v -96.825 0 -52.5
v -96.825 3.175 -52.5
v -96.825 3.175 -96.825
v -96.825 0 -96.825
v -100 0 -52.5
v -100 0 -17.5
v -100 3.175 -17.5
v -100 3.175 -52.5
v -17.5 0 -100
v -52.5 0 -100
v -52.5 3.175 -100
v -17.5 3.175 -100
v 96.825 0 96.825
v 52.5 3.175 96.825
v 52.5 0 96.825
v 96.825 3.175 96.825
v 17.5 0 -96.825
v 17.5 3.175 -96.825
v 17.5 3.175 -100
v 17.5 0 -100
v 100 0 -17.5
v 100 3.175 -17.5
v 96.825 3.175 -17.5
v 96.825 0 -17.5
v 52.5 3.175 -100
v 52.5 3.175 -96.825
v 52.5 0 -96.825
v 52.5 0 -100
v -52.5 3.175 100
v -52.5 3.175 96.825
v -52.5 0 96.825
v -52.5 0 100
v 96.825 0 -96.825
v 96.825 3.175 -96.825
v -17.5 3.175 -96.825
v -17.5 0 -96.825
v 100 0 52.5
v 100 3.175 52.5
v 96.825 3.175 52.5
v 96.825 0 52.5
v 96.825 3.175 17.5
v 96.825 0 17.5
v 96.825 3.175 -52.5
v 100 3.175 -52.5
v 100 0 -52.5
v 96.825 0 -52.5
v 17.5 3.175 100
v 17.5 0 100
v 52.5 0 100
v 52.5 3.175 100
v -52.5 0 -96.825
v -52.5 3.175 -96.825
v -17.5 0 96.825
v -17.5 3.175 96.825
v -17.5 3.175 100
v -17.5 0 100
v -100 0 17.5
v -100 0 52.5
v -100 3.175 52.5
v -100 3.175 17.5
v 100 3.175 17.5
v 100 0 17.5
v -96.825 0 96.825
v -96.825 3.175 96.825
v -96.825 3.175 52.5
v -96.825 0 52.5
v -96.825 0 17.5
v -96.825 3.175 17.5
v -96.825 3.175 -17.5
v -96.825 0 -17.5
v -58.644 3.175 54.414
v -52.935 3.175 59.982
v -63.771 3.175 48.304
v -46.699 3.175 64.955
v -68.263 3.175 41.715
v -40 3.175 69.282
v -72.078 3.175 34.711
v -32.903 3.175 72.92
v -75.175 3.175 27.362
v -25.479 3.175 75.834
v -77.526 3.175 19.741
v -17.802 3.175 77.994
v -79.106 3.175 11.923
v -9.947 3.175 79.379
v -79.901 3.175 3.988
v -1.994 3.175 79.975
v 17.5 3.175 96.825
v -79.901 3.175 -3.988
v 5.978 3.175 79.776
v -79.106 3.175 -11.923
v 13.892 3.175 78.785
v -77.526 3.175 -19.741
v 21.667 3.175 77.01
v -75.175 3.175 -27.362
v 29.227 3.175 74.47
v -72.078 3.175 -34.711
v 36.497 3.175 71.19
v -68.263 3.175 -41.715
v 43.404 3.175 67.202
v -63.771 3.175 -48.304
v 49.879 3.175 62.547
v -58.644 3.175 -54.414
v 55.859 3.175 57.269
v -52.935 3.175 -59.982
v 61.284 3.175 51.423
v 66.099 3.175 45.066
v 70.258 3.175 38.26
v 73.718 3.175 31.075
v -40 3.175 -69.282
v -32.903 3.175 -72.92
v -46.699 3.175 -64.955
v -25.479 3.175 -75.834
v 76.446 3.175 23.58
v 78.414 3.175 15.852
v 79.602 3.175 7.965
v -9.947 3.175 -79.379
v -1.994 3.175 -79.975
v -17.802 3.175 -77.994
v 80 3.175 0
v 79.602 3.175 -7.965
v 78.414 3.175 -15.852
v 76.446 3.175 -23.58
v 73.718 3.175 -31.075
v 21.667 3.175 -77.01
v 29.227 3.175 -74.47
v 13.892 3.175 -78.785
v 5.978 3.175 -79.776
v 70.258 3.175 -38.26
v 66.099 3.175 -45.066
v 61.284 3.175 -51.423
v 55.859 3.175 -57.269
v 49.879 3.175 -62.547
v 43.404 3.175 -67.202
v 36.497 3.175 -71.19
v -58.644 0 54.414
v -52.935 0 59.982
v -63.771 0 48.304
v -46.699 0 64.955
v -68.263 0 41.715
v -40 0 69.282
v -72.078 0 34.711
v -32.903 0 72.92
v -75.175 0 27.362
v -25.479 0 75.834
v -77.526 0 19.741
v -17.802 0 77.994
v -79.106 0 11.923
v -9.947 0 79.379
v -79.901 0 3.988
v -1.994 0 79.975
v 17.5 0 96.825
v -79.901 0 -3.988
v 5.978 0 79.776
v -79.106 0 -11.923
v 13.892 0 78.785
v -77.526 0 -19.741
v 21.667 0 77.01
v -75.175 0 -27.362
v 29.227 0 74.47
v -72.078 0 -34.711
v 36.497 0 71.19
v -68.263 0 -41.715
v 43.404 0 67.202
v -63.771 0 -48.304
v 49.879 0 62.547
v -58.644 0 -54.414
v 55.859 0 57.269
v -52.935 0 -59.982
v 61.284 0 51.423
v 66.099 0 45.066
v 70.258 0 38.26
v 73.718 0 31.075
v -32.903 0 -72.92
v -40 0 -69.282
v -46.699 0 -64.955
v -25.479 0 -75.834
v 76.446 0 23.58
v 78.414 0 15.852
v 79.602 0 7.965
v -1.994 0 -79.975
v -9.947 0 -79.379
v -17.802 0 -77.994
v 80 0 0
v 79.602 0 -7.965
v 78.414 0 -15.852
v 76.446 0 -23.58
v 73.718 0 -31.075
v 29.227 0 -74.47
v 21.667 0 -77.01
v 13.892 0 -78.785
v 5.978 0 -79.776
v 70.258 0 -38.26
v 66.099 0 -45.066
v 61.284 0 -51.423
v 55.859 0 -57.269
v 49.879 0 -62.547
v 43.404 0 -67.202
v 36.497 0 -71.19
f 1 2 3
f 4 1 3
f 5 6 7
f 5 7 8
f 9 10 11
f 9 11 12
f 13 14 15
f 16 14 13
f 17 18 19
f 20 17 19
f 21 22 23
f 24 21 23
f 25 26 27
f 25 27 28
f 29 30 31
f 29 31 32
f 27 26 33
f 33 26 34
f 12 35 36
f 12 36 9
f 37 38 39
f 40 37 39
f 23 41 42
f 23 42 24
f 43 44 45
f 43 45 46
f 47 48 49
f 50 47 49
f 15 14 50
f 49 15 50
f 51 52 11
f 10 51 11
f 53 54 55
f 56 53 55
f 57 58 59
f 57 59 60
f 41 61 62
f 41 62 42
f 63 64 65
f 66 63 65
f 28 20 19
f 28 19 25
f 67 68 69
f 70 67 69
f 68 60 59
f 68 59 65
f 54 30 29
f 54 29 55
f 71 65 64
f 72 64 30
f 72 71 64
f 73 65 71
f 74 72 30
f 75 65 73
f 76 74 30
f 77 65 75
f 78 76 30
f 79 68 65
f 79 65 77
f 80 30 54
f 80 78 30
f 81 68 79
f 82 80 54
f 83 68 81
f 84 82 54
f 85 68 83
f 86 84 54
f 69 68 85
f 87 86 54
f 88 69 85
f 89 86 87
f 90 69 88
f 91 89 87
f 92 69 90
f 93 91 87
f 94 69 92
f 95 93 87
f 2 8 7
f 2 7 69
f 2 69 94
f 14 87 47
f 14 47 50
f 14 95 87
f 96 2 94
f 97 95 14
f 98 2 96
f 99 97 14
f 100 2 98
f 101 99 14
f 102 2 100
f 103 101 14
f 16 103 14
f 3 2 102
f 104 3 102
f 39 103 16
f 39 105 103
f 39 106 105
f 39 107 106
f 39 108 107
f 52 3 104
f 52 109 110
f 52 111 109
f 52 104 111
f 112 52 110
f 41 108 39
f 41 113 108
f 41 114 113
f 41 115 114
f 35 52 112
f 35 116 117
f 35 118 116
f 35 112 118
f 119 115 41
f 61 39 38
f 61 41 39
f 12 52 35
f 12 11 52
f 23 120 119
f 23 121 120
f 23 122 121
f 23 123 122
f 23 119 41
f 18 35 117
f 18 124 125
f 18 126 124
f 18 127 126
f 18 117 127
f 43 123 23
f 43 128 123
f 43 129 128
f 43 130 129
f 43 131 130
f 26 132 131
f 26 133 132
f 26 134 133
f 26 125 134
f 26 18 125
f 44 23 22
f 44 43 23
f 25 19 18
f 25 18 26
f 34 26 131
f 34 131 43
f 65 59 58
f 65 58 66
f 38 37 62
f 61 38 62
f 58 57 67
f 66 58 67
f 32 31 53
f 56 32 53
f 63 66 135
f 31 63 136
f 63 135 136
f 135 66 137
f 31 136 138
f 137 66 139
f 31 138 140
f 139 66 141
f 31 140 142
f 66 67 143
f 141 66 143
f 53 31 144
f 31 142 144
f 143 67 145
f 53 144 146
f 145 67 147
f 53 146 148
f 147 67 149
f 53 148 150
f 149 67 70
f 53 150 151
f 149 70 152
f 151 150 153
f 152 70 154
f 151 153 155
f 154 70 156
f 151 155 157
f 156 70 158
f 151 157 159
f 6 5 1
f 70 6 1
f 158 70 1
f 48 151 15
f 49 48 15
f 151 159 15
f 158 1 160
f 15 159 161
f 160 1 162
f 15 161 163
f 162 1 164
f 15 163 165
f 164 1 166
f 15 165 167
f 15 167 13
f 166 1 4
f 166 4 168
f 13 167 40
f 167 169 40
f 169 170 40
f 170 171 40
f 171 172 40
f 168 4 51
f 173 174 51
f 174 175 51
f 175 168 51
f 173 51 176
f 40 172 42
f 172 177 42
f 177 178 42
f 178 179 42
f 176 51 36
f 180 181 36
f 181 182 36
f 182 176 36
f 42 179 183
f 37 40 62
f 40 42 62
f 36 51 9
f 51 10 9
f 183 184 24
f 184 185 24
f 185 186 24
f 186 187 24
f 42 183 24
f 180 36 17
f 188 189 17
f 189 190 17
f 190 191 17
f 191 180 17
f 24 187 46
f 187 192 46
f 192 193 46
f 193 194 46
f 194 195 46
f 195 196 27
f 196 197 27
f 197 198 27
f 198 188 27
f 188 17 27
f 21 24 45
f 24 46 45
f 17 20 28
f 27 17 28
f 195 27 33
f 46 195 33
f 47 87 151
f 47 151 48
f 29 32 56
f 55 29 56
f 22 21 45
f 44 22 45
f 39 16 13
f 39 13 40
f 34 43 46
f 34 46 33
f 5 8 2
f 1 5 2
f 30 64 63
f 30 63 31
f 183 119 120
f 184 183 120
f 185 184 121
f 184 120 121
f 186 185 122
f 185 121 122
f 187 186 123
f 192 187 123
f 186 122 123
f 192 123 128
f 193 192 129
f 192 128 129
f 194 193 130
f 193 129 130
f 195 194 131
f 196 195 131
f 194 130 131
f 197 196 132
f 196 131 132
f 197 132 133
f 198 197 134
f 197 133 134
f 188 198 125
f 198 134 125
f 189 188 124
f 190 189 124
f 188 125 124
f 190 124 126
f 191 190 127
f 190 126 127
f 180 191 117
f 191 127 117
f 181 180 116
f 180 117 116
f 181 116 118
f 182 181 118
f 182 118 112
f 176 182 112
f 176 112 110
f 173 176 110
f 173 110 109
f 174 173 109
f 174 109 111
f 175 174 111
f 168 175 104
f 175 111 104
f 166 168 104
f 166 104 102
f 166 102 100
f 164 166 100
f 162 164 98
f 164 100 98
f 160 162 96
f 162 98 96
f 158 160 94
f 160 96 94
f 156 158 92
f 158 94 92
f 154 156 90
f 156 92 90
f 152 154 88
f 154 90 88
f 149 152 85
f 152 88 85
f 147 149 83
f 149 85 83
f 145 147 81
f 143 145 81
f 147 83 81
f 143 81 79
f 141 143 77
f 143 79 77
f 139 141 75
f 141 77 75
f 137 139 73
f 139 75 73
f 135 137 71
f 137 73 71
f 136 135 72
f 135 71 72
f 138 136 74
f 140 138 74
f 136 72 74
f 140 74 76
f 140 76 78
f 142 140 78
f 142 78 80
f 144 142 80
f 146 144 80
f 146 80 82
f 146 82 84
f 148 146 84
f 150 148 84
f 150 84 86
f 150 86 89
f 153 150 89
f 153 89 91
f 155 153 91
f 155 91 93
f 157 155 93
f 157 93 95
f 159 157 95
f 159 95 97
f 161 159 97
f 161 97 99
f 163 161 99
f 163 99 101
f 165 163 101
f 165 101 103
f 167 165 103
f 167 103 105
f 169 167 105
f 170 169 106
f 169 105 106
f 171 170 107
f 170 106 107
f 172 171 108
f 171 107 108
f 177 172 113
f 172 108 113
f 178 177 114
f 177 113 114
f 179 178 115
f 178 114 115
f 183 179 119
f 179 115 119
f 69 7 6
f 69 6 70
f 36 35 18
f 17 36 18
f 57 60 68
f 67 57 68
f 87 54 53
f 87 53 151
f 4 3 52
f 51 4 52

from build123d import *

# Parameters (mm, degrees)
ESQUISSE1_W             = 200
ESQUISSE1_H             = 200
BOSS_EXTRU_1_DEPTH      = 3.175
ESQUISSE2_W             = 3.175
ESQUISSE2_H             = 35
ESQUISSE2_H_2           = 47.5
ENL_V_MAT_EXTRU_1_DEPTH = 3.175
ESQUISSE4_W             = 44.325
ESQUISSE4_H             = 3.175
ESQUISSE4_W_2           = 35
ENL_V_MAT_EXTRU_3_DEPTH = 3.175
ESQUISSE3_R             = 80
ENL_V_MAT_EXTRU_2_DEPTH = 3.175


with BuildPart() as part:
    # Esquisse1 → Boss.-Extru.1 (new body)
    with BuildSketch(Plane(origin=(0, 0, 0), x_dir=(1, 0, 0), z_dir=(0, 1, 0))):
        Rectangle(ESQUISSE1_W, ESQUISSE1_H)
    extrude(amount=BOSS_EXTRU_1_DEPTH)

    # Esquisse2 → Enlèv. mat.-Extru.1 (cut)
    with BuildSketch(Plane(origin=(0, 3.175, 0), x_dir=(1, 0, 0), z_dir=(0, 1, 0))):
        with Locations((-98.4125, 0)):
            Rectangle(ESQUISSE2_W, ESQUISSE2_H)
        with Locations((-98.4125, 76.25)):
            Rectangle(ESQUISSE2_W, ESQUISSE2_H_2)
        with Locations((-98.4125, -76.25)):
            Rectangle(ESQUISSE2_W, ESQUISSE2_H_2)
    enl_v_mat_extru_1 = extrude(amount=-ENL_V_MAT_EXTRU_1_DEPTH, mode=Mode.SUBTRACT)

    # Symétrie1: Enlèv. mat.-Extru.1 across plane
    add(enl_v_mat_extru_1.mirror(Plane(origin=(0, 0, 0), x_dir=(0, 0, 1), z_dir=(1, 0, 0))), mode=Mode.SUBTRACT)

    # Esquisse4 → Enlèv. mat.-Extru.3 (cut)
    with BuildSketch(Plane(origin=(0, 3.175, 0), x_dir=(1, 0, 0), z_dir=(0, 1, 0))):
        with Locations((-74.6625, 98.4125)):
            Rectangle(ESQUISSE4_W, ESQUISSE4_H)
        with Locations((0, 98.4125)):
            Rectangle(ESQUISSE4_W_2, ESQUISSE4_H)
        with Locations((74.6625, 98.4125)):
            Rectangle(ESQUISSE4_W, ESQUISSE4_H)
    enl_v_mat_extru_3 = extrude(amount=-ENL_V_MAT_EXTRU_3_DEPTH, mode=Mode.SUBTRACT)

    # Symétrie2: Enlèv. mat.-Extru.3 across plane
    add(enl_v_mat_extru_3.mirror(Plane.XY), mode=Mode.SUBTRACT)

    # Esquisse3 → Enlèv. mat.-Extru.2 (cut)
    with BuildSketch(Plane(origin=(0, 3.175, 0), x_dir=(1, 0, 0), z_dir=(0, 1, 0))):
        Circle(ESQUISSE3_R)
    extrude(amount=-ENL_V_MAT_EXTRU_2_DEPTH, mode=Mode.SUBTRACT)


solid = part.part
